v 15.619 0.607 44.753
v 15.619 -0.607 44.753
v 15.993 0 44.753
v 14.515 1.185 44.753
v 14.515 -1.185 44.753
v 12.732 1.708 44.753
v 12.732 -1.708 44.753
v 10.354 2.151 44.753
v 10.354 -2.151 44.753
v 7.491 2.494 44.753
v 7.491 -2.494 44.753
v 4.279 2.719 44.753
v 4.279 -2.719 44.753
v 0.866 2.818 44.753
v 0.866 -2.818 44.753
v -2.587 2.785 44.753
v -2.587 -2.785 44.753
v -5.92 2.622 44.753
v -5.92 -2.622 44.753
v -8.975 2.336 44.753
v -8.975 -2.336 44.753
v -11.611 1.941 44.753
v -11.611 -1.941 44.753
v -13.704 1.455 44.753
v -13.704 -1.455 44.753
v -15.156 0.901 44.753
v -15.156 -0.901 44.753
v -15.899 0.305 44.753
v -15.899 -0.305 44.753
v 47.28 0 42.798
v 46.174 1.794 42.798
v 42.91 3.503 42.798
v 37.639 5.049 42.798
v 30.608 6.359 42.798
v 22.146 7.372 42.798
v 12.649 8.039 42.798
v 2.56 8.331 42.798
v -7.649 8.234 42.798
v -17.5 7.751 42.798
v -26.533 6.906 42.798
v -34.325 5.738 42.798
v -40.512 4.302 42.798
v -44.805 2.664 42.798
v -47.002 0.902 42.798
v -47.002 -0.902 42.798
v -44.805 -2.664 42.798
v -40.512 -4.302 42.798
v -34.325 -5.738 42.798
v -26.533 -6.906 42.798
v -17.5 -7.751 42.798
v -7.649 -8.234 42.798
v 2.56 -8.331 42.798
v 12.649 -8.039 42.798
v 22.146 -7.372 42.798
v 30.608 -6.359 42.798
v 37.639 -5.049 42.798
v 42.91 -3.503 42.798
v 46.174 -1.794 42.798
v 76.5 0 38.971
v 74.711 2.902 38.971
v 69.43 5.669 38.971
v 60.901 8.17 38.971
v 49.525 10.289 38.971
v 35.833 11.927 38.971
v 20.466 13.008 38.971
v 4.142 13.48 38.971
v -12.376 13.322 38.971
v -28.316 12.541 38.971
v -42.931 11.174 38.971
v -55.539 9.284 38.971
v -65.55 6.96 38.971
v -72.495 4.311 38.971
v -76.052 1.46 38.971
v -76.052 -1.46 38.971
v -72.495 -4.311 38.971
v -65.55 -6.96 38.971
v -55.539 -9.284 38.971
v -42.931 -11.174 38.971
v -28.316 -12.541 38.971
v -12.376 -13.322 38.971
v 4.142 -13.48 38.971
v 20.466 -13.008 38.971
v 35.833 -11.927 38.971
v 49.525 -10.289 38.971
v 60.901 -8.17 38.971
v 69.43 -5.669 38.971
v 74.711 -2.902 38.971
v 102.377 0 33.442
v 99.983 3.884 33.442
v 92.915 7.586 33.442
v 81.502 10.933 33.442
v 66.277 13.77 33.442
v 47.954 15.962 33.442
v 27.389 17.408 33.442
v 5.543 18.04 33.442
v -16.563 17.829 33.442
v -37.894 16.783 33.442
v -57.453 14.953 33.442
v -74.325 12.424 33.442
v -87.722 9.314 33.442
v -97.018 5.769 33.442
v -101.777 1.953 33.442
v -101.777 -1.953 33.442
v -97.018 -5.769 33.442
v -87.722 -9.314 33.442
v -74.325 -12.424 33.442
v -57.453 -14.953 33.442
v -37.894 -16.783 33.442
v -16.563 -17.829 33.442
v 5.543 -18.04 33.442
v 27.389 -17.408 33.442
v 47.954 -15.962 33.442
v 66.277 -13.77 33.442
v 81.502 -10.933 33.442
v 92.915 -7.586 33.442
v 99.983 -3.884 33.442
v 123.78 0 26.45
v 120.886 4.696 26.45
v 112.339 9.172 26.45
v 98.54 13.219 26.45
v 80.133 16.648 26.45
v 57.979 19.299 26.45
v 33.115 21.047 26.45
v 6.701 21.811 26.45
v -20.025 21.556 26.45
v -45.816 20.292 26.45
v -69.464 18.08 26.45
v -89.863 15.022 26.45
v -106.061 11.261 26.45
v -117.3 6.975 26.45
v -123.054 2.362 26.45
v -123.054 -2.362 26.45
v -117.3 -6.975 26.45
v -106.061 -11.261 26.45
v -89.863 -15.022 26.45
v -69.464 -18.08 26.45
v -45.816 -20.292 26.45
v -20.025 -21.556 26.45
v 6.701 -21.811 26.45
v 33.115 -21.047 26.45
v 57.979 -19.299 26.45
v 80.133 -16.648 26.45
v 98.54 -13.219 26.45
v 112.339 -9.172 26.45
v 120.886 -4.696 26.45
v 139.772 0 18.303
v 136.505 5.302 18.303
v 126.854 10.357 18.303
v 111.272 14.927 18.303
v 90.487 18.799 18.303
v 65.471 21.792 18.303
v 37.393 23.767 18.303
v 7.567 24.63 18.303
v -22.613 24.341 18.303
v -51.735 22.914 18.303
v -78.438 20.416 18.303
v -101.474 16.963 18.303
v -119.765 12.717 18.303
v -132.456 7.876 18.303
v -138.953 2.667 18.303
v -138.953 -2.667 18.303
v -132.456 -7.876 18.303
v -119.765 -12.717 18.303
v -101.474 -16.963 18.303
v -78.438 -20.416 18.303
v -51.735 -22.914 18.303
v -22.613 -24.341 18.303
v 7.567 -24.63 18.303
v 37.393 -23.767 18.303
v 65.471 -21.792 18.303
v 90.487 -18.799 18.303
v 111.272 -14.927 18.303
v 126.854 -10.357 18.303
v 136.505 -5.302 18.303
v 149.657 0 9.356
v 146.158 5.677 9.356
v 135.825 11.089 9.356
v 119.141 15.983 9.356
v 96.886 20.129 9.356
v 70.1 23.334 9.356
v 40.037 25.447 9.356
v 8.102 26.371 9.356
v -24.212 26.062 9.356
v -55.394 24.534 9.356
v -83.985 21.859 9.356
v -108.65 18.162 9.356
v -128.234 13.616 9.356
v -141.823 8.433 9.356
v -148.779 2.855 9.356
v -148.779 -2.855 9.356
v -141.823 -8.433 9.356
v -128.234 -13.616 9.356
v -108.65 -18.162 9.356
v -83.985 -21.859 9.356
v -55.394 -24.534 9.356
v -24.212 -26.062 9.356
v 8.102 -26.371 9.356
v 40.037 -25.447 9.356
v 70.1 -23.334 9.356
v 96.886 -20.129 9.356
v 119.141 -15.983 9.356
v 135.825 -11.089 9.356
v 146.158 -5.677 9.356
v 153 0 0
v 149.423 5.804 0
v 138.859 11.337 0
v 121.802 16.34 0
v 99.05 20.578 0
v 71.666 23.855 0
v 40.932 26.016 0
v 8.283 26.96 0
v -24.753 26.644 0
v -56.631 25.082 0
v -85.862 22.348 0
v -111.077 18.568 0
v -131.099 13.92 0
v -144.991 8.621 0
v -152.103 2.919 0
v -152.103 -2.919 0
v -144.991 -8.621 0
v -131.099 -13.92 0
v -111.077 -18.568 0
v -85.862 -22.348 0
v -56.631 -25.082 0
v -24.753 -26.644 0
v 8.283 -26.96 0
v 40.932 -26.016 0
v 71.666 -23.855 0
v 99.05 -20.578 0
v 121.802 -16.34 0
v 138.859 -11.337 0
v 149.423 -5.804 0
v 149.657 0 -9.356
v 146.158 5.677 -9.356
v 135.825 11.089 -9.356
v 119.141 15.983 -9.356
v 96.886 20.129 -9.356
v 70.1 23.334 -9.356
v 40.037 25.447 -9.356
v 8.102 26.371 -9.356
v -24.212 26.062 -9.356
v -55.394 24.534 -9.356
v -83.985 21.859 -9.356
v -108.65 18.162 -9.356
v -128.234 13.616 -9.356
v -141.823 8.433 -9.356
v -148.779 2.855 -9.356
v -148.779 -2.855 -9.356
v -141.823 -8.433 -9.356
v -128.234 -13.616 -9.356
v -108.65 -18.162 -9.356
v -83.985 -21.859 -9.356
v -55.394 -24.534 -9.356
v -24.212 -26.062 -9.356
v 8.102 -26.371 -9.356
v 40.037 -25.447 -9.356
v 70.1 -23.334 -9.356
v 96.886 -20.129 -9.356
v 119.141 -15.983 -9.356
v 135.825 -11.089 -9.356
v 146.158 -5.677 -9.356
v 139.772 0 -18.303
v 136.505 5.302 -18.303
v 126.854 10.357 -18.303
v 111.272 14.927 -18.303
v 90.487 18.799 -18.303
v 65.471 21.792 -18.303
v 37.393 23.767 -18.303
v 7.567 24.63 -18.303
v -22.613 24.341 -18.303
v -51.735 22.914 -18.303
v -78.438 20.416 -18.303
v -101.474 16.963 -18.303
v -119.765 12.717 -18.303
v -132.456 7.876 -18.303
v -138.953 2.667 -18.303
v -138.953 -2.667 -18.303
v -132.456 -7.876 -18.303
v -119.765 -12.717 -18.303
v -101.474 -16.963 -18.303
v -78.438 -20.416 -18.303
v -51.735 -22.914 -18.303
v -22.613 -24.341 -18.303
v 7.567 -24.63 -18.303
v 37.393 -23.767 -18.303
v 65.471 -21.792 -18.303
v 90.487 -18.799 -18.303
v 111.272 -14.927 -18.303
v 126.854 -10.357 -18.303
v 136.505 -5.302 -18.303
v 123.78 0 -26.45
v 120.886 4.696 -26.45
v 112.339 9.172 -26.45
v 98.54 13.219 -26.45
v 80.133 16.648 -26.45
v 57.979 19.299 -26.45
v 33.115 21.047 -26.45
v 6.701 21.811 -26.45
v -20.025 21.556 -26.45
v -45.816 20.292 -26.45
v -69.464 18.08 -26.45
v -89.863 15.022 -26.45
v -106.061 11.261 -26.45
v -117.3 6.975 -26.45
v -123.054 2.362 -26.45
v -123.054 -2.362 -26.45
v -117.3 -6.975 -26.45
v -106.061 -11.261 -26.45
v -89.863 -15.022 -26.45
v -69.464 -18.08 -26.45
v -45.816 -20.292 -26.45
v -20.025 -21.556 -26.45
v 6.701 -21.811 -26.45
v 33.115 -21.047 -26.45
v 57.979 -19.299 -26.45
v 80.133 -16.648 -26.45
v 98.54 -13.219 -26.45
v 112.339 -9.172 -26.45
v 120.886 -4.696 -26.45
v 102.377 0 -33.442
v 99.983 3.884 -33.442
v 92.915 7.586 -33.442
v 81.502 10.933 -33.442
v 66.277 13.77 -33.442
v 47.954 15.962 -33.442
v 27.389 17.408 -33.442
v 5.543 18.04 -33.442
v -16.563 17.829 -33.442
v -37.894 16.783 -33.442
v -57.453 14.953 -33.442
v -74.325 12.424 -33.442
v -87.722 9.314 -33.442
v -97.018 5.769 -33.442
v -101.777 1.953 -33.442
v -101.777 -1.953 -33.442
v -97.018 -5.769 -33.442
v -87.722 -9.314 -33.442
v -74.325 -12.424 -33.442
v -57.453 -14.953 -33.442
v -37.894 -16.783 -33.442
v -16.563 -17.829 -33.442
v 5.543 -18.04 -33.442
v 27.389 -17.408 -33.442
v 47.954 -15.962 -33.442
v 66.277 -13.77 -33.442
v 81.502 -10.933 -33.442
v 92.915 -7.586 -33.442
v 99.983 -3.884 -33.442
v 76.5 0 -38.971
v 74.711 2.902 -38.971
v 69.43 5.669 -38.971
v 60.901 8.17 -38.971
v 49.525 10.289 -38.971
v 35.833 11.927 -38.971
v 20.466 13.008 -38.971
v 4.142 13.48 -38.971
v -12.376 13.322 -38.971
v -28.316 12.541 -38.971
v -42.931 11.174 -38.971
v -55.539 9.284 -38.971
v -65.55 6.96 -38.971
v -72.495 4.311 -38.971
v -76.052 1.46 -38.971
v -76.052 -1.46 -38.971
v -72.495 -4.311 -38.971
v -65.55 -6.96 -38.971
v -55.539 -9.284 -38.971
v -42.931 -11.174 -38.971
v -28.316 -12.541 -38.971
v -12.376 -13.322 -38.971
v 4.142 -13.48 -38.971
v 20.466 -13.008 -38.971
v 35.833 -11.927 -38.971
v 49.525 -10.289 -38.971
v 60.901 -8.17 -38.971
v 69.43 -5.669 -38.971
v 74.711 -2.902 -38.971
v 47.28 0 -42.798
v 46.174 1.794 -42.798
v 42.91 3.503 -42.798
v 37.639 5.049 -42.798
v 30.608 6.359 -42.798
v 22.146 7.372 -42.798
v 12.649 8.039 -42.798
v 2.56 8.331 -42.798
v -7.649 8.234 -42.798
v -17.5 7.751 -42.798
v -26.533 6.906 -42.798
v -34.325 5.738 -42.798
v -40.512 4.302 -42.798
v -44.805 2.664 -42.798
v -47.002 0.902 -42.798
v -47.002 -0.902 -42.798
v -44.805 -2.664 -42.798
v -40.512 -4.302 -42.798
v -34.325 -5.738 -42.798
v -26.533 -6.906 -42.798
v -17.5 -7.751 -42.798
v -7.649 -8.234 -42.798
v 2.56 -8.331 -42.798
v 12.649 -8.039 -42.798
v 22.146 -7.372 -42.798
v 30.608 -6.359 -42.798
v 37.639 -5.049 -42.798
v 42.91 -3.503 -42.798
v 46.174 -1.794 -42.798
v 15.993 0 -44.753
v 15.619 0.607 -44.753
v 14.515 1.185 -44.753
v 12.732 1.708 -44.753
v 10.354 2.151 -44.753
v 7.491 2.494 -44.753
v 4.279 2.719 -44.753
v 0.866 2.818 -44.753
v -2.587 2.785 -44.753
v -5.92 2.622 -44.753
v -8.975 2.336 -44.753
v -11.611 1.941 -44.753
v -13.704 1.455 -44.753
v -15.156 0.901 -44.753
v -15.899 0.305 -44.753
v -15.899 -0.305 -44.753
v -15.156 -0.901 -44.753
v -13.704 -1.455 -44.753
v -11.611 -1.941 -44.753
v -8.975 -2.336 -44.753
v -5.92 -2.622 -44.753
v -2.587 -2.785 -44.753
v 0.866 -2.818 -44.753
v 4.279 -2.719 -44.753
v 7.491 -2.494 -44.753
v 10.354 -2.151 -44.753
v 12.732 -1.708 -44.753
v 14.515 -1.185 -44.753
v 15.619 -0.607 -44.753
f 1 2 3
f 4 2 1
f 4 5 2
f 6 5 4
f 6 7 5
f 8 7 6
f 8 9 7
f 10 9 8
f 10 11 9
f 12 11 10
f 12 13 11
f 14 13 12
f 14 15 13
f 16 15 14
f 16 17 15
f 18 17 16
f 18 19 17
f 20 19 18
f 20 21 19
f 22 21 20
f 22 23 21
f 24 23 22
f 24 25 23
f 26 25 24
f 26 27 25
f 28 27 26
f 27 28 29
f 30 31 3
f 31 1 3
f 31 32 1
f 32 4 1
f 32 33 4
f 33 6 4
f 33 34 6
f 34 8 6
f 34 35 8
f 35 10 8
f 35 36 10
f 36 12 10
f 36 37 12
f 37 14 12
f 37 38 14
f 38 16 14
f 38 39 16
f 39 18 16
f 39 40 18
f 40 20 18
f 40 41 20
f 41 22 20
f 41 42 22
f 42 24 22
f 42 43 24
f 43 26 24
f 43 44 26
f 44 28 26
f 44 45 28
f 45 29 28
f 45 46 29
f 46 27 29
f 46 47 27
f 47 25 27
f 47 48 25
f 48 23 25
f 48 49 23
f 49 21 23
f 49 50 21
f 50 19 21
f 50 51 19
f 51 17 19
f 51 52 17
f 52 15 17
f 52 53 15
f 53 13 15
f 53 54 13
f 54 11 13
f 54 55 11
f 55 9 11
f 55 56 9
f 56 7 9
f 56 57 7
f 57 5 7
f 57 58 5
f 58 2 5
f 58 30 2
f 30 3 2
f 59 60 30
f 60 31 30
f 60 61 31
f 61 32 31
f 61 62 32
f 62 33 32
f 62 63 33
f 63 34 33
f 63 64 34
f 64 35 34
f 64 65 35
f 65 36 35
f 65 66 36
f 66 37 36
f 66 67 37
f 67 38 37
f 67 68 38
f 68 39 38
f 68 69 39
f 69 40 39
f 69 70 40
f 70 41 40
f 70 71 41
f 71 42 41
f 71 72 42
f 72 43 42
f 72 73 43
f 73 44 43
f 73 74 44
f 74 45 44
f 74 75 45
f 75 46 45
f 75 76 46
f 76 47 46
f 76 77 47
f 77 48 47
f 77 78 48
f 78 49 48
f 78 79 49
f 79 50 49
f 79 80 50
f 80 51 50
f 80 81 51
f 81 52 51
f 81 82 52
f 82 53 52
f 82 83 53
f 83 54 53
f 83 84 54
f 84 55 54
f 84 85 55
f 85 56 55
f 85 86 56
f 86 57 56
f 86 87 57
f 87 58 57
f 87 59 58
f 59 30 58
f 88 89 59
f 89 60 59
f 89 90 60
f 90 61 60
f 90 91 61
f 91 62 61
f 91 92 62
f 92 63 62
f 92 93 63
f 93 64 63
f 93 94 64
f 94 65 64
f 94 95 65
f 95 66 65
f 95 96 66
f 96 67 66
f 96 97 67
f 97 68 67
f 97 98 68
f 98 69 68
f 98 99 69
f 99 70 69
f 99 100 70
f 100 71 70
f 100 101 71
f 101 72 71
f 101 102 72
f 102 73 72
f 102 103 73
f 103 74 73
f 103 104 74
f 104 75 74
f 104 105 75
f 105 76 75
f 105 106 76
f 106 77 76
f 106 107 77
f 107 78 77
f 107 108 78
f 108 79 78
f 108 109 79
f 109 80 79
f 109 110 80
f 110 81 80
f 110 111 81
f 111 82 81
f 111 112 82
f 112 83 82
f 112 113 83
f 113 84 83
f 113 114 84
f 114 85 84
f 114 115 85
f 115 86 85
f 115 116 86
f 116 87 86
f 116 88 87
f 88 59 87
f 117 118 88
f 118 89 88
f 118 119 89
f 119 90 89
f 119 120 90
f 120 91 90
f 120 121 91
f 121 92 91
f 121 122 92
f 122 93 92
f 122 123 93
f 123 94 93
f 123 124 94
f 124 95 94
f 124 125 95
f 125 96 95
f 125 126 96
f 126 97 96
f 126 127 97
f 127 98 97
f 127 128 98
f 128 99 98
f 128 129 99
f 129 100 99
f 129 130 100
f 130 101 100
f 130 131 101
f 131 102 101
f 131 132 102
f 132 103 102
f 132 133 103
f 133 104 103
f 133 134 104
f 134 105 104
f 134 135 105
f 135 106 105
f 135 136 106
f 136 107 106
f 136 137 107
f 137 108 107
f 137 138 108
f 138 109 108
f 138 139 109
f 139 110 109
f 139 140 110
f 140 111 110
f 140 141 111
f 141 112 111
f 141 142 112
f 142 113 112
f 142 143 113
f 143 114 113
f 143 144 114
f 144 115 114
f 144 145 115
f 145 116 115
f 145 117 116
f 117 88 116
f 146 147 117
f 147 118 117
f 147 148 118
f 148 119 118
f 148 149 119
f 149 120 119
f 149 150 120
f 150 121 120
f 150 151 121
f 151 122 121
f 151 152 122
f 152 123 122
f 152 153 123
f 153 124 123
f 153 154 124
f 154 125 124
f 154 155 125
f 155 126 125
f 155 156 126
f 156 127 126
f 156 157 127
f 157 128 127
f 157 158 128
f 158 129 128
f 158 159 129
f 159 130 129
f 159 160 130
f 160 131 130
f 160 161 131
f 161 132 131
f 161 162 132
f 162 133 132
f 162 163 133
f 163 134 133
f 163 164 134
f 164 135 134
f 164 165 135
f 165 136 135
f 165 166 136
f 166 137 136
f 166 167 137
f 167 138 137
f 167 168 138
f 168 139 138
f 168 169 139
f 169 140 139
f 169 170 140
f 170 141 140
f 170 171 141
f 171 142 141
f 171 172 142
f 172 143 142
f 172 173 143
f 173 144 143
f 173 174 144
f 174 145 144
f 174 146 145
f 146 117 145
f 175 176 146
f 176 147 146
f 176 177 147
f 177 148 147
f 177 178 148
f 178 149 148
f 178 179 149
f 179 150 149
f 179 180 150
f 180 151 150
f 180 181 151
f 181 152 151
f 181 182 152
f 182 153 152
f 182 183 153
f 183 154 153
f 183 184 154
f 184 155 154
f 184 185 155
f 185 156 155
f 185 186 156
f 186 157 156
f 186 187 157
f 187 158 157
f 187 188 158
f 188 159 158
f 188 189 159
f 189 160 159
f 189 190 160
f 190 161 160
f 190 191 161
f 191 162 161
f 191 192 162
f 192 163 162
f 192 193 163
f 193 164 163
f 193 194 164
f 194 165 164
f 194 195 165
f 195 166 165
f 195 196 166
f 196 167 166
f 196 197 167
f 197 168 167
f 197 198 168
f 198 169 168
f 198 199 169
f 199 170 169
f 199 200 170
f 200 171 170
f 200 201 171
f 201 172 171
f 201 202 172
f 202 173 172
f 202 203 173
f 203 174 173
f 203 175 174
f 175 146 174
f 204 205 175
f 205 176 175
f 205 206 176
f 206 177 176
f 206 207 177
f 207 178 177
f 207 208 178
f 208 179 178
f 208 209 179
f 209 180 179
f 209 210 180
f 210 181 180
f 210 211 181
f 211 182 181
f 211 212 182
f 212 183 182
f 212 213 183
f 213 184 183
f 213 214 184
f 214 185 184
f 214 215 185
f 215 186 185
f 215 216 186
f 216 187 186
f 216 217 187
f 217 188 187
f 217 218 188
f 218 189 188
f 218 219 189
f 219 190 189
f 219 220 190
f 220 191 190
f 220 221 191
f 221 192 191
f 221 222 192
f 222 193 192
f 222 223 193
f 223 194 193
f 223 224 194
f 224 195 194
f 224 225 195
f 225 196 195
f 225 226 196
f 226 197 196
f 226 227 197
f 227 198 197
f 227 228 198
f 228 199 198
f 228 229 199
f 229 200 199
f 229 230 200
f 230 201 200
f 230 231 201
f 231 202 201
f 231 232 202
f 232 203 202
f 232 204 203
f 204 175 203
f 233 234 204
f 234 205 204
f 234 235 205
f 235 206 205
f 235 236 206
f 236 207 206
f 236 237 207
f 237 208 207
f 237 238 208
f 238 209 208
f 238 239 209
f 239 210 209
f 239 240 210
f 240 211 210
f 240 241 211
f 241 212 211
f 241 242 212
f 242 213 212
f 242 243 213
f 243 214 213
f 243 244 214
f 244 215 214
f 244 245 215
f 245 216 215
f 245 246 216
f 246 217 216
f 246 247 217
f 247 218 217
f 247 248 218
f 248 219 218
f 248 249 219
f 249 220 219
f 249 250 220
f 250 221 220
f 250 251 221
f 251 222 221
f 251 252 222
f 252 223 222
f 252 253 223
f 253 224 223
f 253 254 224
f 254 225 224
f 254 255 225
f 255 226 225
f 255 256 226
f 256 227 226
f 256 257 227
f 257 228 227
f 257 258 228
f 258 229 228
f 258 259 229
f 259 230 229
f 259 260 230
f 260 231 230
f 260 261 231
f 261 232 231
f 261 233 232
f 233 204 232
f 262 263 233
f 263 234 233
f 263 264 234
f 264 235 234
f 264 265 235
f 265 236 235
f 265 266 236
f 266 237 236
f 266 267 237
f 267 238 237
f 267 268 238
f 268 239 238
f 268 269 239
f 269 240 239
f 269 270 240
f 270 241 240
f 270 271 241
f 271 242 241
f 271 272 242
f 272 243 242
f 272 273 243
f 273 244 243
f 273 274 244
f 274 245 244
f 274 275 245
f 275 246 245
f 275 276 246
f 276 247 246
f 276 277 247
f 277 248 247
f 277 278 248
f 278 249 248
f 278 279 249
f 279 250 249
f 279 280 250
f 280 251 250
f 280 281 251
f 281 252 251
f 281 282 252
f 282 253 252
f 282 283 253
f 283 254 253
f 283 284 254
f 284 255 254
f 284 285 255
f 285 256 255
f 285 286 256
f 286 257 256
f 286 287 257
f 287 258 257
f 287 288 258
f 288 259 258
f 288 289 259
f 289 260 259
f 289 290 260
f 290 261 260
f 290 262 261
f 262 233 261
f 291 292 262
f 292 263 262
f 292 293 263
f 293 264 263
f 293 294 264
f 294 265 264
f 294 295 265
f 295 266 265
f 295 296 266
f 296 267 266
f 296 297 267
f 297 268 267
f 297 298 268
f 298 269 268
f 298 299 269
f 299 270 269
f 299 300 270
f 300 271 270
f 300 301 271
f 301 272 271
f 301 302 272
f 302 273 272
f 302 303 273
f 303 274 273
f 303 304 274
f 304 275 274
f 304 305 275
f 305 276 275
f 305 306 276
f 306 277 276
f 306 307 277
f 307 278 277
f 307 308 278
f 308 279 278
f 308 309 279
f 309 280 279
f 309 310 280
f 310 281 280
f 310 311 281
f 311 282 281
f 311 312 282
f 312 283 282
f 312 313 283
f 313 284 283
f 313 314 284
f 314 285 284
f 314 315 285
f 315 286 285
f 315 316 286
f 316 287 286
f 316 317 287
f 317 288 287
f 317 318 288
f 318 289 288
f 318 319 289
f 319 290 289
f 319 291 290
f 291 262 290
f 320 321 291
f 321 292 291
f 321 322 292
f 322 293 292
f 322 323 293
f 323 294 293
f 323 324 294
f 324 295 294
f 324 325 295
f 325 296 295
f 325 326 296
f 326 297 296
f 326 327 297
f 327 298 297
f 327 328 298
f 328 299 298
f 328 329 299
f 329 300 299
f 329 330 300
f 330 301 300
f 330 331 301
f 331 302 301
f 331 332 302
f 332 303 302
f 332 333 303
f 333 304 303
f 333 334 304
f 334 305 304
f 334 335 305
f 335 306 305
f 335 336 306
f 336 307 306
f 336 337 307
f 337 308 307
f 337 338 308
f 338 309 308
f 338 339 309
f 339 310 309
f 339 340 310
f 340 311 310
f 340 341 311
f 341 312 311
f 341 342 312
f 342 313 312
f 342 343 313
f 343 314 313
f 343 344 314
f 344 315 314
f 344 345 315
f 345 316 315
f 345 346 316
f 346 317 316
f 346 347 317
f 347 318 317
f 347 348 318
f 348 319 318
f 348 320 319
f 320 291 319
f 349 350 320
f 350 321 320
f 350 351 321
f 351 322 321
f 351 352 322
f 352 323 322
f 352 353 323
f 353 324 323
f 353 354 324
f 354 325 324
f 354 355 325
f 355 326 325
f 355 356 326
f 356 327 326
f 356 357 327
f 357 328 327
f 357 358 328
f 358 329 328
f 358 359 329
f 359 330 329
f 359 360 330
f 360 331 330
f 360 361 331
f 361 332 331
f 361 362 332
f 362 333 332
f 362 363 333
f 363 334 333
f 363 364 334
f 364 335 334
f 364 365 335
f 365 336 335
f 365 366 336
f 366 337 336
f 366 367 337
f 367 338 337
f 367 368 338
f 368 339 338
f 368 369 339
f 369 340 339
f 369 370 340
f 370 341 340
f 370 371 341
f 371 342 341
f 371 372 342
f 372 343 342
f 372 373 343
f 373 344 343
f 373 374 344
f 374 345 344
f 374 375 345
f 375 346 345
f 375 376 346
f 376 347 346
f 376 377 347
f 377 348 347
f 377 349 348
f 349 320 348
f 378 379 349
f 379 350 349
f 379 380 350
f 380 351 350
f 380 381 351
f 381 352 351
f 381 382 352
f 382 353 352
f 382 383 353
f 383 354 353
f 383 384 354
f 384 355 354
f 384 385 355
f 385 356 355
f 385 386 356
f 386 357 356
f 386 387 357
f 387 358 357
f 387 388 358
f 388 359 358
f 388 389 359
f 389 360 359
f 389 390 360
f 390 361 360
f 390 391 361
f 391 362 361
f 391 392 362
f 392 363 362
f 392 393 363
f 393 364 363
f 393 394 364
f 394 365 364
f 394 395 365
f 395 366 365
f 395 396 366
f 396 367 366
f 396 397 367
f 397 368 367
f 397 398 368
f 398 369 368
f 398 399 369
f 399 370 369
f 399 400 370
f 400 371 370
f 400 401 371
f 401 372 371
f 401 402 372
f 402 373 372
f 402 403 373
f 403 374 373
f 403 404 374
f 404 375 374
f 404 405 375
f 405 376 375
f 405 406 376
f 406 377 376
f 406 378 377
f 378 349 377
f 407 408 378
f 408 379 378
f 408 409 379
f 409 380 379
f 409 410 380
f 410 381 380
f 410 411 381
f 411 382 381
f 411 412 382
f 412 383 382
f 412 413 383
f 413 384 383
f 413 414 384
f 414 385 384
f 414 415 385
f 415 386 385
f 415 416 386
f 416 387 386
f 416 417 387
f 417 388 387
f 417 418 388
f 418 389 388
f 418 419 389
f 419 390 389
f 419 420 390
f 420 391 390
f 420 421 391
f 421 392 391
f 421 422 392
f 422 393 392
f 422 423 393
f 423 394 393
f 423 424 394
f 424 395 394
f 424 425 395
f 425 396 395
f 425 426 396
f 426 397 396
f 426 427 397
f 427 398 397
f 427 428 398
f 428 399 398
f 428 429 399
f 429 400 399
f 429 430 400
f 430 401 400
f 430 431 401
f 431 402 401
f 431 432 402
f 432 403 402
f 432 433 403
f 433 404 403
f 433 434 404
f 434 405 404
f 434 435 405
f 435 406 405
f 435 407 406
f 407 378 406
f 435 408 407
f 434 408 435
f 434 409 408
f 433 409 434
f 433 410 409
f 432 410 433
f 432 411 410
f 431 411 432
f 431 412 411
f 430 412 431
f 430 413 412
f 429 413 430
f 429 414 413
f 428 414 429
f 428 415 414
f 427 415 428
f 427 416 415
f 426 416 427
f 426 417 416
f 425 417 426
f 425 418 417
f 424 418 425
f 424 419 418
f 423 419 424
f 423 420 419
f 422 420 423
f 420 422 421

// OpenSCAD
// Generated by SolidPython 1.0.1 on 2020-07-29 00:46:52


scale(v = [17, 3, 5]) {
	sphere(r = 9);
}
/***********************************************
*********      SolidPython code:      **********
************************************************
 
# import packages: SolidPython
from solid import *
from solid.utils import *
from itertools import chain, combinations, permutations


class Resize:

    def __init__(self, scad_file):
        self.scad_file = scad_file
        #self.scad_file = import_scad(scad_file)
        # cone/cylinder param:
        self.r1 = 0
        self.r2 = 0
        self.h = 0
        # rectangular prism param:
        self.w = 0
        self.l = 0
        # ellipse param:
        self.r = 0

    # import OpenScad code (file name corresponds to shape)


    # classify shape + parameters
    def assign(self, param1, param2, param3):
        if self.scad_file == 'cone.scad':
            self.r1 = param1
            self.r2 = param2
            self.h = param3
        elif self.scad_file == 'cylinder.scad':
            self.r1 = param1
            self.r2 = param2
            self.h = param3
        elif self.scad_file == 'rectangularPrism.scad':
            self.h = param1
            self.l = param2
            self.w = param3
        else:
            self.r = param1
            self.h = param2

    # resize parameters
    def iterate(self):
        x = range(3, 20, 2)
        i = 1
        if self.scad_file == 'cone.scad':
            tempList = list(permutations(x, 2))
            for temp in tempList:
                param1 = temp[0]
                param2 = temp[1]
                filepath = 'produced_scad_files/' + 'cone' + str(param1) + '_' + str(param2) + '_' + '.scad'
                scad_render_to_file(cylinder(h=param1, r1=param2, r2=0), filepath)

        elif self.scad_file == 'cylinder.scad':
            tempList = list(permutations(x, 3))
            for temp in tempList:
                param1 = temp[0]
                param2 = temp[1]
                filepath = 'produced_scad_files/' + 'cylinder' + str(param1) + '_' + str(param2) + '_' + '.scad'
                scad_render_to_file(cylinder(h=param1, r1=param2, r2=param2), filepath)

        elif self.scad_file == 'rectangularPrism.scad':
            tempList = list(permutations(x, 3))
            for temp in tempList:
                param1 = temp[0]
                param2 = temp[1]
                param3 = temp[2]
                filepath = 'produced_scad_files/' + 'rectangularPrism' + str(param1) + '_' + str(param2) + '_' + str(
                    param3) + '.scad'
                scad_render_to_file(cube(size=(param1, param2, param3)), filepath)

        elif self.scad_file == 'ellipse.scad':
            tempList = list(permutations(x, 4))
            for temp in tempList:
                param1 = temp[0]
                param2 = temp[1]
                param3 = temp[2]
                param4 = temp[3]
                filepath = 'produced_scad_files/' + 'ellipse' + str(param1) + '_' + str(param2) + '_' + str(param3) + '_' + str(param4) + '.scad'
                scad_render_to_file(scale([param1, param2, param3])(sphere(r=param4)), filepath)

    def render_to_scadfile(self):
        scad_render_to_file(scad, 'example.scad') 
 
************************************************/
